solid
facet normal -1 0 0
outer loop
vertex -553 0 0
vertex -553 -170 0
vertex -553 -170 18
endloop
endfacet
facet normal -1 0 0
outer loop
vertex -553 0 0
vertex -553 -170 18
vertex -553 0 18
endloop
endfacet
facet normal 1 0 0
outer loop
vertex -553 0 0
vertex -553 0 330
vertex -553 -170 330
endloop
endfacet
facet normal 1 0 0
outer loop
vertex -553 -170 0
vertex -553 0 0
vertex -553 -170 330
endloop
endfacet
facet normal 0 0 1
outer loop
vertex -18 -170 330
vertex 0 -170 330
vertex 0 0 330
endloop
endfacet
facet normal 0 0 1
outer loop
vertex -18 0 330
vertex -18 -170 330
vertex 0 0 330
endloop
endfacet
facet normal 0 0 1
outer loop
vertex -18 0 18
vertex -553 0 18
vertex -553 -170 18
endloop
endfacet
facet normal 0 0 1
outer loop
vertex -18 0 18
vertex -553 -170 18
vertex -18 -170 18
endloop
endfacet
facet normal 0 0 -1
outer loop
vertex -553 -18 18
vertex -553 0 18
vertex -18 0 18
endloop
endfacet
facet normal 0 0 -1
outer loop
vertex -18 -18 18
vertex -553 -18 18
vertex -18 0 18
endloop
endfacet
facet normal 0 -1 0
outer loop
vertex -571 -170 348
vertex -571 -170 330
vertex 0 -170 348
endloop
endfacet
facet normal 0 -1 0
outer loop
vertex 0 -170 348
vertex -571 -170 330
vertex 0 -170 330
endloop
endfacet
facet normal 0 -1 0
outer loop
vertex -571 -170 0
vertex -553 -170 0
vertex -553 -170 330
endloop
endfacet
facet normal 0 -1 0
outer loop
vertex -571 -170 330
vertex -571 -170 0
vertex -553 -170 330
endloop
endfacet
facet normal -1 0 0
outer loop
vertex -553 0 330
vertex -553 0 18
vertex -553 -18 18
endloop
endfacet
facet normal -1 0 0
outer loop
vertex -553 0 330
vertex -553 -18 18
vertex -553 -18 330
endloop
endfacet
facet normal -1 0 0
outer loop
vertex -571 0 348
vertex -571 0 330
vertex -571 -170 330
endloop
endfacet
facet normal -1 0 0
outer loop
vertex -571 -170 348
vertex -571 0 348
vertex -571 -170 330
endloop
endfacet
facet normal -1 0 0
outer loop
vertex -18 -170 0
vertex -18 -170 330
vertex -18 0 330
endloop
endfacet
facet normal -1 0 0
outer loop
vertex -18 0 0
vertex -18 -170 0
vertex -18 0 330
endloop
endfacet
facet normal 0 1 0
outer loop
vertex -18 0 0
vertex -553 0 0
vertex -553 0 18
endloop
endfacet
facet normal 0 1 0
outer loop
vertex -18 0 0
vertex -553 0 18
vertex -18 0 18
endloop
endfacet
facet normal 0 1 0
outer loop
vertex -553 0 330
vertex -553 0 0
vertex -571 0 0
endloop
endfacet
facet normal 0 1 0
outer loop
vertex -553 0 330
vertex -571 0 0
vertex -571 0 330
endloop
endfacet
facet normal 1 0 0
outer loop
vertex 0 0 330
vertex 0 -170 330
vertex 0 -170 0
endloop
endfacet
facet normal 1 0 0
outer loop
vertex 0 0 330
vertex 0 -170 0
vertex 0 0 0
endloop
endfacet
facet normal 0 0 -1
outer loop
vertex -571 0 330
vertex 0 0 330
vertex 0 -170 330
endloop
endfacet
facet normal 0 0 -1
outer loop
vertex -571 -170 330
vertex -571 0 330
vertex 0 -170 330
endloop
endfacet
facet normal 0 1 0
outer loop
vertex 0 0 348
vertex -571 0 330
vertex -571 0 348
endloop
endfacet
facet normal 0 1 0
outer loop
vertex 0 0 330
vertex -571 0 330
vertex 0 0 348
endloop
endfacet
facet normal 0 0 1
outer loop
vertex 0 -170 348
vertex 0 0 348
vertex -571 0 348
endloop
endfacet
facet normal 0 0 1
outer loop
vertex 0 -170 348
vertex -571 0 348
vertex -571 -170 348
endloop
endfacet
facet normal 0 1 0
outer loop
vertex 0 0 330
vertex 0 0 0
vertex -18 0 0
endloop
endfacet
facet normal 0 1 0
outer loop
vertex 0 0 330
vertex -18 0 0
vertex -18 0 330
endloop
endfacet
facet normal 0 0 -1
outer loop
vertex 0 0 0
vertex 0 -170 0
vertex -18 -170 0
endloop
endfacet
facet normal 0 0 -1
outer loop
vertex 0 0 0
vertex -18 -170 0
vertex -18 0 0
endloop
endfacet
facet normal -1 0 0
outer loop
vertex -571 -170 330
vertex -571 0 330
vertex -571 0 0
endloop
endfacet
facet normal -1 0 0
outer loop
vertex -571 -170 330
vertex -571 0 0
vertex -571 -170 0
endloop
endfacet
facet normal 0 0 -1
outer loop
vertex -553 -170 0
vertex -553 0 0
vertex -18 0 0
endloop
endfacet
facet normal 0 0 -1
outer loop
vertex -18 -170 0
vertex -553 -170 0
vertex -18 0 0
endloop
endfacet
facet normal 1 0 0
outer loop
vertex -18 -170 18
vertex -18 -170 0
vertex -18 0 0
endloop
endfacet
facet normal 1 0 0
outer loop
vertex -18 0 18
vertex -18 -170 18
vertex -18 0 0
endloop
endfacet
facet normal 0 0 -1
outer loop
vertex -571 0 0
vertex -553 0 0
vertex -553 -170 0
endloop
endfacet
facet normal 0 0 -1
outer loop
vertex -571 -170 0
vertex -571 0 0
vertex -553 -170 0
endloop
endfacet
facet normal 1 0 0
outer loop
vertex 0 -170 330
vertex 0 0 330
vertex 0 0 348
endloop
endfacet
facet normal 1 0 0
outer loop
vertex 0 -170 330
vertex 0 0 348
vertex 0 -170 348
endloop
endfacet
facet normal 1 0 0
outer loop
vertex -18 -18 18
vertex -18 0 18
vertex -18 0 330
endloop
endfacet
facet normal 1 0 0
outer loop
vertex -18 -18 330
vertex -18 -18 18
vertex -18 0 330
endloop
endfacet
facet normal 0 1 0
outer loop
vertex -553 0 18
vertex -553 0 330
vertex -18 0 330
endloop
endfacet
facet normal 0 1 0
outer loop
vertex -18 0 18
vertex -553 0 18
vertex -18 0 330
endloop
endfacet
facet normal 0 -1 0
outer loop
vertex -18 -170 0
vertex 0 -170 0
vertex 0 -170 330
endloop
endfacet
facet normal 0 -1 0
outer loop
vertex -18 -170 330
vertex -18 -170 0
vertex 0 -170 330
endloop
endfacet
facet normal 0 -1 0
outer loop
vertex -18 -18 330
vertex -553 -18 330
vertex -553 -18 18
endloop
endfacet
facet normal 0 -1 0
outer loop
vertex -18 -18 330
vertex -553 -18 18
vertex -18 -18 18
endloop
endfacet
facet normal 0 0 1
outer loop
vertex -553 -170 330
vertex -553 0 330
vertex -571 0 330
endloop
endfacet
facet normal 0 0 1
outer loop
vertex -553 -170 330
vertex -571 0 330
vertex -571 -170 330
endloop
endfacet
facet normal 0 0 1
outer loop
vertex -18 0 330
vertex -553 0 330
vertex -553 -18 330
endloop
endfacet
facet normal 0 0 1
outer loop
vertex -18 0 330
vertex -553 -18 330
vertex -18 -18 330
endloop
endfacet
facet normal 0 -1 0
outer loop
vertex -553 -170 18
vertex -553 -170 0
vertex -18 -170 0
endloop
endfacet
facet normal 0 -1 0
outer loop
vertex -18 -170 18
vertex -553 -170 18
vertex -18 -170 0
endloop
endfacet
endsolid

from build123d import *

# Parameters (mm, degrees)
SKETCH_W     = 535
SKETCH_H     = 312
PAD_DEPTH    = 18
SKETCH001_W  = 535
SKETCH001_H  = 170
PAD001_DEPTH = 18
SKETCH002_W  = 170
SKETCH002_H  = 330
PAD002_DEPTH = 18
SKETCH003_W  = 170
SKETCH003_H  = 330
PAD003_DEPTH = 18
SKETCH004_W  = 170
SKETCH004_H  = 571
PAD004_DEPTH = 18


with BuildPart() as backplate:
    # Sketch → Pad (new body)
    with BuildSketch(Plane.XZ):
        with Locations((-285.5, 174)):
            Rectangle(SKETCH_W, SKETCH_H)
    extrude(amount=PAD_DEPTH)


with BuildPart() as bottomplate:
    # Sketch001 → Pad001 (new body)
    with BuildSketch(Plane.XY):
        with Locations((-285.5, -85)):
            Rectangle(SKETCH001_W, SKETCH001_H)
    extrude(amount=PAD001_DEPTH)


with BuildPart() as rightplate:
    # Sketch002 → Pad002 (new body)
    with BuildSketch(Plane.YZ):
        with Locations((-85, 165)):
            Rectangle(SKETCH002_W, SKETCH002_H)
    extrude(amount=-PAD002_DEPTH)


with BuildPart() as leftplate:
    # Sketch003 (on Face1 of ShapeBinder002) → Pad003 (new body)
    with BuildSketch(Plane(origin=(-553, 0, 0), x_dir=(0, -1, 0), z_dir=(-1, 0, 0))):
        with Locations((85, 165)):
            Rectangle(SKETCH003_W, SKETCH003_H)
    extrude(amount=PAD003_DEPTH)


with BuildPart() as topplate:
    # Sketch004 (on Face1 of ShapeBinder003) → Pad004 (new body)
    with BuildSketch(Plane(origin=(0, 0, 330), x_dir=(0, -1, 0), z_dir=(0, 0, 1))):
        with Locations((85, -285.5)):
            Rectangle(SKETCH004_W, SKETCH004_H)
    extrude(amount=PAD004_DEPTH)


solid = Compound([backplate.part, bottomplate.part, rightplate.part, leftplate.part, topplate.part])
